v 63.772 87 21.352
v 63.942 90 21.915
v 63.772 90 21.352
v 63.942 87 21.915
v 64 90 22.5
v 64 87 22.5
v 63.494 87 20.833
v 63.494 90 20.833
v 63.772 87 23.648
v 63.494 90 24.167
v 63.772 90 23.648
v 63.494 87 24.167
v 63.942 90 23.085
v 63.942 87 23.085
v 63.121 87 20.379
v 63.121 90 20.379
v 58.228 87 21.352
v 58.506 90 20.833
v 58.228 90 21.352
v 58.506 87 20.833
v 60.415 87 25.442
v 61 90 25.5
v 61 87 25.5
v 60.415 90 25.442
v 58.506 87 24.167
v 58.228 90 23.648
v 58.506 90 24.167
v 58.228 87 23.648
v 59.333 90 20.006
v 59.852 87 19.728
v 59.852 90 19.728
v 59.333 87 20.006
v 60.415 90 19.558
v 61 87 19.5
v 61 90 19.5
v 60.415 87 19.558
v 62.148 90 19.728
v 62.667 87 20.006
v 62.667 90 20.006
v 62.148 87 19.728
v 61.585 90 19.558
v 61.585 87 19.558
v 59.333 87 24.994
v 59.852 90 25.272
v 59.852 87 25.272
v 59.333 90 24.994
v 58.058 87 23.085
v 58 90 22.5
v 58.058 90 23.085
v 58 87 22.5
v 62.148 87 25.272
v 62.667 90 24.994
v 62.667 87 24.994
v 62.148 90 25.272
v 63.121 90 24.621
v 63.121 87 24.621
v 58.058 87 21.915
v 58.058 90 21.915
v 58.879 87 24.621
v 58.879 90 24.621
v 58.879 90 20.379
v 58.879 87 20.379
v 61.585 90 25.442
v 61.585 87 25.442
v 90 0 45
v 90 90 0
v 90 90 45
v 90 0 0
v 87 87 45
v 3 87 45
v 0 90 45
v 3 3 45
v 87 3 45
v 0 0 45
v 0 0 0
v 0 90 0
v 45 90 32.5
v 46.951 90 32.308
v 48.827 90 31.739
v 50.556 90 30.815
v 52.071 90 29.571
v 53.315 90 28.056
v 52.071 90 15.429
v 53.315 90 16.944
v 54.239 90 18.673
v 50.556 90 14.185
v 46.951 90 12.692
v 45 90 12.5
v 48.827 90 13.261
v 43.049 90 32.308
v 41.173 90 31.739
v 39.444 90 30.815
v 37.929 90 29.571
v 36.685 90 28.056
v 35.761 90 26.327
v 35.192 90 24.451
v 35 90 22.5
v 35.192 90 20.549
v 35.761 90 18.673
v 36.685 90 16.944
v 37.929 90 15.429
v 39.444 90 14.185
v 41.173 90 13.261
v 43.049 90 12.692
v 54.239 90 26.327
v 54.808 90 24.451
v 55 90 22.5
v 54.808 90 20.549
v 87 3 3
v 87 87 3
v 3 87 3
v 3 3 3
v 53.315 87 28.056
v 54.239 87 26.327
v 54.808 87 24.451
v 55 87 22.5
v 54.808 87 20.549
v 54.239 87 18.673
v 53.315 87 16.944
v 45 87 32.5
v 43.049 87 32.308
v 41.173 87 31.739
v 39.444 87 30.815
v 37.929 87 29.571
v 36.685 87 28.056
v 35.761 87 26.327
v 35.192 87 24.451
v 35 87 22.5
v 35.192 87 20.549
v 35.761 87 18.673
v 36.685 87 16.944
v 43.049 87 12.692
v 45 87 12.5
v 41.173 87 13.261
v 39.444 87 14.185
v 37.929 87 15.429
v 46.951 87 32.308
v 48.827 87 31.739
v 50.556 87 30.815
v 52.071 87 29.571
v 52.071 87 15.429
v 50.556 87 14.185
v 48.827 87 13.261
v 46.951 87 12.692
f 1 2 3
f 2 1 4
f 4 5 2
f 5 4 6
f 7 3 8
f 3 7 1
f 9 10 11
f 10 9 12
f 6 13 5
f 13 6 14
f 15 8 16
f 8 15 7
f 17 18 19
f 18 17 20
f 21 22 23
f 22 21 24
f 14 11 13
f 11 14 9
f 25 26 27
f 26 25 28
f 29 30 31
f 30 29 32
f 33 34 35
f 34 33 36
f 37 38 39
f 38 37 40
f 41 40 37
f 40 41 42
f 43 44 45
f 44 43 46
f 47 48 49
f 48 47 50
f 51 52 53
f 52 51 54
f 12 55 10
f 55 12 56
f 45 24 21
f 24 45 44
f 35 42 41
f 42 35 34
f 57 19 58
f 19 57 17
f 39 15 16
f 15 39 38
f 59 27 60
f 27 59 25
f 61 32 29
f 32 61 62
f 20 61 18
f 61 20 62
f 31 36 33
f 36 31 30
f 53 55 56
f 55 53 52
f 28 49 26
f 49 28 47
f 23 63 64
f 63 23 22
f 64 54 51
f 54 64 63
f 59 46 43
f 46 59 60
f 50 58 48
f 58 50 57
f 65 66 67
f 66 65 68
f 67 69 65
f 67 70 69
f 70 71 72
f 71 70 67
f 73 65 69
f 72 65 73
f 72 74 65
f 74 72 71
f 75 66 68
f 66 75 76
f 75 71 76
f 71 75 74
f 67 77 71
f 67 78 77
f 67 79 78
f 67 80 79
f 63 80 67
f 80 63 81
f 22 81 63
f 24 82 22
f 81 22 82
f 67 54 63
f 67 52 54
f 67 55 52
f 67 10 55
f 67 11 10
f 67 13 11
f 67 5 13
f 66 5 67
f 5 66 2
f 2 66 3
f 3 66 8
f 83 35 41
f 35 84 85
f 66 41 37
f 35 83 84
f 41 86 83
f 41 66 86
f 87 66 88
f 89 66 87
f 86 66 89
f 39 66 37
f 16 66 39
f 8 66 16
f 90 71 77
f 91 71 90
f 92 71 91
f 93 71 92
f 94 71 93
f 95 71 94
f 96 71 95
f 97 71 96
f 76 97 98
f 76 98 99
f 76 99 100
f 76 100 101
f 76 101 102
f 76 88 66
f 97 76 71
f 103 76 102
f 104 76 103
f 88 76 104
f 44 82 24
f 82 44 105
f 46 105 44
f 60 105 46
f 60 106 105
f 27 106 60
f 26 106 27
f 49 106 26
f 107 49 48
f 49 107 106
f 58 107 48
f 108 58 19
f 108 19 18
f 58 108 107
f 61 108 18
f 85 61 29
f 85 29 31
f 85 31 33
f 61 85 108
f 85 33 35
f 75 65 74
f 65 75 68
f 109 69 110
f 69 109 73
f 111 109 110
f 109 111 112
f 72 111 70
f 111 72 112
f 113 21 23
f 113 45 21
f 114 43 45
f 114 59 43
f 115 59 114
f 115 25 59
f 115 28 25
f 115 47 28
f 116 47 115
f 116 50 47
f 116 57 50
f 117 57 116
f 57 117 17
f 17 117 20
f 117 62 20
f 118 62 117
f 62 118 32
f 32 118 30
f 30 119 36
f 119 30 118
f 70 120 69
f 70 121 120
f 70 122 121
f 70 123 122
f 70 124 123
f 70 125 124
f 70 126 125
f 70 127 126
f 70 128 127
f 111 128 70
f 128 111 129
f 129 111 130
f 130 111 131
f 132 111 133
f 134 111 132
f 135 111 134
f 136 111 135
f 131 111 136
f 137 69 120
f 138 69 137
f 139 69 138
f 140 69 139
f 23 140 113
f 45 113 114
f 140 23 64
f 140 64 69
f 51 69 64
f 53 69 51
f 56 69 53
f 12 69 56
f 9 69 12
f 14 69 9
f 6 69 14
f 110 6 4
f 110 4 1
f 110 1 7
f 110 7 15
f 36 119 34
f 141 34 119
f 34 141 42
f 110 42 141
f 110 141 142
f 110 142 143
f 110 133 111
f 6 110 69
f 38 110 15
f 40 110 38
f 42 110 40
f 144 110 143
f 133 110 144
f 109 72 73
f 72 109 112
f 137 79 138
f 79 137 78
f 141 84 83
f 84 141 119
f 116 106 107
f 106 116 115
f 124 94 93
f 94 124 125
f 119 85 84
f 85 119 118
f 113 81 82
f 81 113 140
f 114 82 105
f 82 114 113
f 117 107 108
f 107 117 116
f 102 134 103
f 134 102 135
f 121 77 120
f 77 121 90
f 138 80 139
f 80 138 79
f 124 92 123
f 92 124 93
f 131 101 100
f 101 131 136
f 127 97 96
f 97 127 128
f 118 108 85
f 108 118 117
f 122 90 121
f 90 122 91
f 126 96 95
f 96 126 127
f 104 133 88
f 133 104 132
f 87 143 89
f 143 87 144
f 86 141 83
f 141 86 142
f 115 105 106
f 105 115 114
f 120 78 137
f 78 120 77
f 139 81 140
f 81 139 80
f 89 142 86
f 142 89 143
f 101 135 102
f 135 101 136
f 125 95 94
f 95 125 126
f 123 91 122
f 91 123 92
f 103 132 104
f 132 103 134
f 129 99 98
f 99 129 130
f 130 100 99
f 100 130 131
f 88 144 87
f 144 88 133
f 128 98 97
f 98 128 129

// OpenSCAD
$fn = 32;

// ----------------------------------------------------------------------
// Vent box: roundvent enclosure
// ----------------------------------------------------------------------

// --- parameters (mm) ---
box_l = 90;               // box length, X
box_w = 90;               // box width, Y
box_h = 45;               // box height, Z
wall_t = 3;               // shell wall thickness
vent_d = 20;              // central vent diameter
ring_d = 6;               // ring hole diameter
n_ring = 6;               // holes in the ring
ring_r = 16;              // ring radius

ring_step = 360 / n_ring;  // ring hole angular step

difference() {
  cube([box_l, box_w, box_h]);
  translate([wall_t, wall_t, wall_t])
    cube([box_l - 2 * wall_t, box_w - 2 * wall_t, box_h]);
  translate([box_l / 2, box_w - wall_t - 1, box_h / 2])
    rotate([-90, 0, 0]) cylinder(h = wall_t + 2, d = vent_d);
  for (i = [0 : n_ring - 1])
    translate([box_l / 2, box_w - wall_t - 1, box_h / 2])
      rotate([0, 0, i * ring_step])
        translate([ring_r, 0, 0]) rotate([-90, 0, 0])
          cylinder(h = wall_t + 2, d = ring_d);
}
